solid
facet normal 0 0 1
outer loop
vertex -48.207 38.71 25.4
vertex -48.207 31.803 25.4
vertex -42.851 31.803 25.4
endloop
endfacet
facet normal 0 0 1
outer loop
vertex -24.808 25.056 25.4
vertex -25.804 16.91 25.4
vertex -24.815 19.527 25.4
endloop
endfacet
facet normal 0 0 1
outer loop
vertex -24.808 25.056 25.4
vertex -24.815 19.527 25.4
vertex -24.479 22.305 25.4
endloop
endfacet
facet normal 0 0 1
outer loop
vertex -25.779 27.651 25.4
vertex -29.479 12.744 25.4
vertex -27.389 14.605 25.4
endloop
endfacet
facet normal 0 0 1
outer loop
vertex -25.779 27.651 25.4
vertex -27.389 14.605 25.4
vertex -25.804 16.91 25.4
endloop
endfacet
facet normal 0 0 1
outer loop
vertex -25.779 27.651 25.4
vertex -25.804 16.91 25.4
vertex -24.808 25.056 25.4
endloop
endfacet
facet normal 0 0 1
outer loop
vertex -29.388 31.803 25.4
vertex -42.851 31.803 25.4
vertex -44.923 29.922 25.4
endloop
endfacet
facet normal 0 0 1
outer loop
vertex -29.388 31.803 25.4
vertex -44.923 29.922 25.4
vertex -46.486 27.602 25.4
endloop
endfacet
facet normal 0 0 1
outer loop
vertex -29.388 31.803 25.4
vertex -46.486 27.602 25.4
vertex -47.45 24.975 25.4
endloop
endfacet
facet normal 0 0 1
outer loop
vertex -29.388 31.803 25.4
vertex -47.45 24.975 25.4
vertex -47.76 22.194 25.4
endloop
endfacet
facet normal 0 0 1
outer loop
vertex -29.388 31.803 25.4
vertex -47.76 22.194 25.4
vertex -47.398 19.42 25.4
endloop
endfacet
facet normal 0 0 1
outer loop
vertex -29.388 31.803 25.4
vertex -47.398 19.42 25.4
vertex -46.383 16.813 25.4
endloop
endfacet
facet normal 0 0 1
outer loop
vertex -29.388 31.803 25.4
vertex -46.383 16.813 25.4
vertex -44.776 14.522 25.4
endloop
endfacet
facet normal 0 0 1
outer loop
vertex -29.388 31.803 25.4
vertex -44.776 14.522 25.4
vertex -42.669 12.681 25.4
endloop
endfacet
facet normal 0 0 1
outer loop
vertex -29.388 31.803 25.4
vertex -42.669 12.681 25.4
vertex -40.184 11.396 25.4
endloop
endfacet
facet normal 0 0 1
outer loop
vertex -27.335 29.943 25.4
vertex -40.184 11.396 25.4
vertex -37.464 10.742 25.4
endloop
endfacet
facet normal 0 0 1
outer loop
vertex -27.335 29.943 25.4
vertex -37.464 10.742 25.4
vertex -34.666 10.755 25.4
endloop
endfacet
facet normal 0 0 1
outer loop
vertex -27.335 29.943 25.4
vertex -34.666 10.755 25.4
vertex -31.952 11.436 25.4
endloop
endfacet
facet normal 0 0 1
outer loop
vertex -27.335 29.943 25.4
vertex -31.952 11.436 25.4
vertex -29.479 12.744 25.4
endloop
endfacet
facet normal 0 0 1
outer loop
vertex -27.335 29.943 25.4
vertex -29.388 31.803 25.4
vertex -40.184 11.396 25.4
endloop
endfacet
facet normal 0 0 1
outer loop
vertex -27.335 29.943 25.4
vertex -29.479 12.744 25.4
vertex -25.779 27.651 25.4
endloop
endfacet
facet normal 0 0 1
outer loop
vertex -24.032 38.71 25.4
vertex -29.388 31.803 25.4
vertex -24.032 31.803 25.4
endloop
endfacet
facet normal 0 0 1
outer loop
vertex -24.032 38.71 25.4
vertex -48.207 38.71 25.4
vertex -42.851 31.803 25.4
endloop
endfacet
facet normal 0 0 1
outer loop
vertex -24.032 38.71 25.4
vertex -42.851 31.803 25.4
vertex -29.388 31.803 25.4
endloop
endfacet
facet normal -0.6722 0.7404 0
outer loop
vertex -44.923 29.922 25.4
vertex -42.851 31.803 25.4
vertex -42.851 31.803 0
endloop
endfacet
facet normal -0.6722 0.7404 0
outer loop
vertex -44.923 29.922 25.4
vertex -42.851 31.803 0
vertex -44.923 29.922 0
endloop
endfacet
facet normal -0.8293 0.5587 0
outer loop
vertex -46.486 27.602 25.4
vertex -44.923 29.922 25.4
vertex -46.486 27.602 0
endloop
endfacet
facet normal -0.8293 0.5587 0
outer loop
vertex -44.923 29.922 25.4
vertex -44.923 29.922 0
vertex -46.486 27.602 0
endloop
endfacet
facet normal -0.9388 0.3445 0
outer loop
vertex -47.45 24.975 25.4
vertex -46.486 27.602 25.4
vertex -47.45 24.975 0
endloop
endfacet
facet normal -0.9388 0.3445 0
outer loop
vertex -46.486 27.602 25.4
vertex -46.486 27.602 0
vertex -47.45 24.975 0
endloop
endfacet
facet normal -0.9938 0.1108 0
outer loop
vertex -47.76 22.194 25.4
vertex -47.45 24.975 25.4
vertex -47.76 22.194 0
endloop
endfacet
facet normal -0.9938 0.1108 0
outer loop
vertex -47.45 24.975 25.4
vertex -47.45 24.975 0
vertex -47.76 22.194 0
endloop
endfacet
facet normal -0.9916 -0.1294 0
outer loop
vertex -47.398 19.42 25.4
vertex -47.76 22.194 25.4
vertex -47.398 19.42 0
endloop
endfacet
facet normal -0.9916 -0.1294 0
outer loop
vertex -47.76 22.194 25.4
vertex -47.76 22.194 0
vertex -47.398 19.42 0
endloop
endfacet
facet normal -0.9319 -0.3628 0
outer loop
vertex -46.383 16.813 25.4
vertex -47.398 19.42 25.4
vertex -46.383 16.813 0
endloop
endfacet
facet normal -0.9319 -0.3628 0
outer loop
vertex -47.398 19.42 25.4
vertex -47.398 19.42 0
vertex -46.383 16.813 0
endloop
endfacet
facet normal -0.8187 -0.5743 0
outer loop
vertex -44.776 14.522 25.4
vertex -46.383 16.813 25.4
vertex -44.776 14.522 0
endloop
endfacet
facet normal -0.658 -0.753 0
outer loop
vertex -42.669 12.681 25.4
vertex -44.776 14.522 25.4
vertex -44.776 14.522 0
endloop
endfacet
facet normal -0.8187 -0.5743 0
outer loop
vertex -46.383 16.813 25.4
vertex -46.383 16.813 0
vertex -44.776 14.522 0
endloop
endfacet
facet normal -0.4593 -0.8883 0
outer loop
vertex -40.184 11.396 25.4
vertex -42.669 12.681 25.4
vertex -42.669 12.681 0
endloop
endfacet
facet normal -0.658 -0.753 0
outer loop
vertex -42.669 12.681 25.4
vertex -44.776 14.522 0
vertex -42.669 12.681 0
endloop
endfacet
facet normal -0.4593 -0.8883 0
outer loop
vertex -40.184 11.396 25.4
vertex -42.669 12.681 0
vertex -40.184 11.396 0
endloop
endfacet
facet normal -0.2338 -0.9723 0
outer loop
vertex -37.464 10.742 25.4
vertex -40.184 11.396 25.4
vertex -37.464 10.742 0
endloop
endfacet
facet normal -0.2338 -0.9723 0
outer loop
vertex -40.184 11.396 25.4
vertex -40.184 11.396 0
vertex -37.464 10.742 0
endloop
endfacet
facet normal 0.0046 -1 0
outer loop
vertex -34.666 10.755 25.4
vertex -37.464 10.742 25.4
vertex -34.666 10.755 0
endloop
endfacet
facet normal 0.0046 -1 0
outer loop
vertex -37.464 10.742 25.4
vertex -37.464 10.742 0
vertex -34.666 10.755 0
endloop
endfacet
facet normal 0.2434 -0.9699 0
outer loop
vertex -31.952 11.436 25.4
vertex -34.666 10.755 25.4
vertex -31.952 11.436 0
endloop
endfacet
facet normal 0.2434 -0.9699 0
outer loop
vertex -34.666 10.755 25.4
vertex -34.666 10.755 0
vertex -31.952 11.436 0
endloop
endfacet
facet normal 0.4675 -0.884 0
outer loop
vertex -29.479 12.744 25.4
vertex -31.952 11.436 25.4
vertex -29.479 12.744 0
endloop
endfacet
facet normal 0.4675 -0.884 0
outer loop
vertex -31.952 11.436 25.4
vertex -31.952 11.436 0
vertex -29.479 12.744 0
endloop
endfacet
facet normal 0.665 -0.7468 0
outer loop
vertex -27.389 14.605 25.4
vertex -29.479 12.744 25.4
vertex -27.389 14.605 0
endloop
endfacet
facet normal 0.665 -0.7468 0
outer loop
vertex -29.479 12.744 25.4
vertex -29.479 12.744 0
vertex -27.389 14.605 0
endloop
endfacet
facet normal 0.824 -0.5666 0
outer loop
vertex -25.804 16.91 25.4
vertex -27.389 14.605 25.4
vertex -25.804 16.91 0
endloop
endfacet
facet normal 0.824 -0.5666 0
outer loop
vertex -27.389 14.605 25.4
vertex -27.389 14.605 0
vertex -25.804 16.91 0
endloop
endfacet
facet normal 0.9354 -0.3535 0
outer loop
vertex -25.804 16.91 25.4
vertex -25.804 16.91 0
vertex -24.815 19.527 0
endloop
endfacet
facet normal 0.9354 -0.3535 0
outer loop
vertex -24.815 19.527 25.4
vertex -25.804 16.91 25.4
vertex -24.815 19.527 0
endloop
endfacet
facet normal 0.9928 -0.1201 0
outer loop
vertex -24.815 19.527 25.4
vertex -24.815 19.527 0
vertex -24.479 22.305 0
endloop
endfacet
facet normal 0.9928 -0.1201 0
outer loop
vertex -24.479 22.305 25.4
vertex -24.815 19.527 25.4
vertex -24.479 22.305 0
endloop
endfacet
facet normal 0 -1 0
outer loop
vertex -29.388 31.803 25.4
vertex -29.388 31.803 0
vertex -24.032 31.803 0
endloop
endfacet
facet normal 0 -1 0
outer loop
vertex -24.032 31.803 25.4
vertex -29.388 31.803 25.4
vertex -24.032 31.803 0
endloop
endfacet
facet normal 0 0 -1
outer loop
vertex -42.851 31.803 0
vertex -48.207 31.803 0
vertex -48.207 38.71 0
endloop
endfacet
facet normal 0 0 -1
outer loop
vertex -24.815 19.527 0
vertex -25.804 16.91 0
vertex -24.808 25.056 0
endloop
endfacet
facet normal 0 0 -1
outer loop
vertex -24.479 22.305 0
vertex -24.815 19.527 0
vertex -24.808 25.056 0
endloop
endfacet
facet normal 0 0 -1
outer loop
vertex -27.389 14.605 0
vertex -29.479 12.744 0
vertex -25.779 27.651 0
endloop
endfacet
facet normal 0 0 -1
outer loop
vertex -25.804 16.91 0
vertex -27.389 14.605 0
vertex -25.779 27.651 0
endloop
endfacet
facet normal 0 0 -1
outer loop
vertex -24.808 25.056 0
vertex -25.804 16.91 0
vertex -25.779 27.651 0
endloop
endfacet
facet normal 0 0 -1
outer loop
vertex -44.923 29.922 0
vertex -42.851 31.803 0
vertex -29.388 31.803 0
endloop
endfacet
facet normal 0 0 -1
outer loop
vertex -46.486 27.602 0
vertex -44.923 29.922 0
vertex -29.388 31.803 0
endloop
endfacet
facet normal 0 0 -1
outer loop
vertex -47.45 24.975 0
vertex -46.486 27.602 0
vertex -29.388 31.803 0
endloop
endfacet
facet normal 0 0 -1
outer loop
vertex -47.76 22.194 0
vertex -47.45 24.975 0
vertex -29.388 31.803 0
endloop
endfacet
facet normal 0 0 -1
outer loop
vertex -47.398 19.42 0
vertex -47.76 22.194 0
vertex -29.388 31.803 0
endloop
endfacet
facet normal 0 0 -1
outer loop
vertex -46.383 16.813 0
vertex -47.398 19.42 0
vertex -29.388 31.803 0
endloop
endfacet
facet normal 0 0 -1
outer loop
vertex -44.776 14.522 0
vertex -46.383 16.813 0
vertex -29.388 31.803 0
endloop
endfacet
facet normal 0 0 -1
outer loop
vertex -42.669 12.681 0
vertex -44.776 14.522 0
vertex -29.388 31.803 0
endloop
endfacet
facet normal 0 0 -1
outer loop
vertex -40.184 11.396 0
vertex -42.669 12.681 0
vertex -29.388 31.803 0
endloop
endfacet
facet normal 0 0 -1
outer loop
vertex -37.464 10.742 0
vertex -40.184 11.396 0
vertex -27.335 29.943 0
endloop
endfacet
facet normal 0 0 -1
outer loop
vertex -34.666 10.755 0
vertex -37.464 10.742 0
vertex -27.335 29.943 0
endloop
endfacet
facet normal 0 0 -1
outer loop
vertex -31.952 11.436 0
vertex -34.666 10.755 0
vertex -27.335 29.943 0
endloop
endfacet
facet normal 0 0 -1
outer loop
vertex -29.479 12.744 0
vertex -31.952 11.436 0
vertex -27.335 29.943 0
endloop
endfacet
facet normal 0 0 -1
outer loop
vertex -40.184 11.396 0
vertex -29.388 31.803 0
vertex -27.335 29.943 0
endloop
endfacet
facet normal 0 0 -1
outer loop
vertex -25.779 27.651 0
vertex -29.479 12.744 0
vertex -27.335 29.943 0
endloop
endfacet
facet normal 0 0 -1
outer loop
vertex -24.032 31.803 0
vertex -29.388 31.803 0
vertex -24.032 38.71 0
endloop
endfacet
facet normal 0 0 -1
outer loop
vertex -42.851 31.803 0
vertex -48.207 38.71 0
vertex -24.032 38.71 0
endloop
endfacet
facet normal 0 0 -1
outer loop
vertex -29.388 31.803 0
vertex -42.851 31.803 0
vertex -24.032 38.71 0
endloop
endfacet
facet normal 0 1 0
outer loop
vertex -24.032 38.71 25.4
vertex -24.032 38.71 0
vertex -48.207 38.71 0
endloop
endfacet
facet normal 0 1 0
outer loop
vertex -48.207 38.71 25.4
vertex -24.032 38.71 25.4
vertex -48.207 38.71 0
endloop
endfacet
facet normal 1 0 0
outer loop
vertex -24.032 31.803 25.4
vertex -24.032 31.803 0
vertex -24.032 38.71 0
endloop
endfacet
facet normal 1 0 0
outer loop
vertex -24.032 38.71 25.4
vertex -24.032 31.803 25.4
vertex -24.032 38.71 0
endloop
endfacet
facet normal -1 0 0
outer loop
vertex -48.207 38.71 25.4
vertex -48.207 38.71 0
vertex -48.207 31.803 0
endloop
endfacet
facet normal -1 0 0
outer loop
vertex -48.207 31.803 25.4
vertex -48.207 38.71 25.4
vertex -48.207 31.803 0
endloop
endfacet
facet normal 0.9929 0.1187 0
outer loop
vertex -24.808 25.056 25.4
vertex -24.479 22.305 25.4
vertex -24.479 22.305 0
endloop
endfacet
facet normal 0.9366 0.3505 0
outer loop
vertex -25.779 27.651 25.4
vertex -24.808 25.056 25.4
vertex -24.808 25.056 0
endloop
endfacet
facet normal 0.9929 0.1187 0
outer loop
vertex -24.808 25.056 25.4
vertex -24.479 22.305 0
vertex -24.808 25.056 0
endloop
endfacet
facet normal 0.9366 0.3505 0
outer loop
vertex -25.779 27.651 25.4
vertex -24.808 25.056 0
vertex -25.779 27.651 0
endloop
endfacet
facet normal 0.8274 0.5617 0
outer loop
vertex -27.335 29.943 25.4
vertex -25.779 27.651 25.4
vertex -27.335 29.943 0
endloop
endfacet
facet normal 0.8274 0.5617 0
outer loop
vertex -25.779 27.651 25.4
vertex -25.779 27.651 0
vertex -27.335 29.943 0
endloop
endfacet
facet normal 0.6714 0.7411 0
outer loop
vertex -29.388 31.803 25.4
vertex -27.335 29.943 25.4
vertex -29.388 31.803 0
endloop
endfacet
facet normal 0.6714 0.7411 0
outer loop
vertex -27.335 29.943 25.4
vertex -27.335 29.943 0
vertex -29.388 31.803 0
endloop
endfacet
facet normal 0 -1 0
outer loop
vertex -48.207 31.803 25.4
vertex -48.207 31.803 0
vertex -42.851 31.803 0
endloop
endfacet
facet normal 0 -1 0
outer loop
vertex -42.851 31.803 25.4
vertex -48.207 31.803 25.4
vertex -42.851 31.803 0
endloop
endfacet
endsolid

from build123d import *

# Parameters (mm, degrees)
F1_DEPTH = 25.4


with BuildPart() as f1:
    # F0 (on Top) → F1 (new body)
    with BuildSketch(Plane.XY):
        with BuildLine():
            ThreePointArc((-42.8508276872, 31.8025350571), (-41.4654203847, 11.9639712949), (-24.4785961914, 22.3049465567))
            ThreePointArc((-24.4785961914, 22.3049465567), (-25.77864226, 27.6507494196), (-29.3884073564, 31.8025350571))
            Line((-29.3884073564, 31.8025350571), (-42.8508276872, 31.8025350571))
        make_face()
        with BuildLine():
            Line((-42.8508276872, 31.8025350571), (-29.3884073564, 31.8025350571))
            ThreePointArc((-29.3884073564, 31.8025350571), (-36.1196175218, 33.945967887), (-42.8508276872, 31.8025350571))
        make_face()
        with BuildLine():
            ThreePointArc((-42.8508276872, 31.8025350571), (-36.1196175218, 33.945967887), (-29.3884073564, 31.8025350571))
            Line((-29.3884073564, 31.8025350571), (-24.0317769349, 31.8025350571))
            Line((-24.0317769349, 31.8025350571), (-24.0317769349, 38.7098751962))
            Line((-24.0317769349, 38.7098751962), (-48.207461834, 38.7098751962))
            Line((-48.207461834, 38.7098751962), (-48.207461834, 31.8025350571))
            Line((-48.207461834, 31.8025350571), (-42.8508276872, 31.8025350571))
        make_face()
    extrude(amount=F1_DEPTH)


solid = f1.part
